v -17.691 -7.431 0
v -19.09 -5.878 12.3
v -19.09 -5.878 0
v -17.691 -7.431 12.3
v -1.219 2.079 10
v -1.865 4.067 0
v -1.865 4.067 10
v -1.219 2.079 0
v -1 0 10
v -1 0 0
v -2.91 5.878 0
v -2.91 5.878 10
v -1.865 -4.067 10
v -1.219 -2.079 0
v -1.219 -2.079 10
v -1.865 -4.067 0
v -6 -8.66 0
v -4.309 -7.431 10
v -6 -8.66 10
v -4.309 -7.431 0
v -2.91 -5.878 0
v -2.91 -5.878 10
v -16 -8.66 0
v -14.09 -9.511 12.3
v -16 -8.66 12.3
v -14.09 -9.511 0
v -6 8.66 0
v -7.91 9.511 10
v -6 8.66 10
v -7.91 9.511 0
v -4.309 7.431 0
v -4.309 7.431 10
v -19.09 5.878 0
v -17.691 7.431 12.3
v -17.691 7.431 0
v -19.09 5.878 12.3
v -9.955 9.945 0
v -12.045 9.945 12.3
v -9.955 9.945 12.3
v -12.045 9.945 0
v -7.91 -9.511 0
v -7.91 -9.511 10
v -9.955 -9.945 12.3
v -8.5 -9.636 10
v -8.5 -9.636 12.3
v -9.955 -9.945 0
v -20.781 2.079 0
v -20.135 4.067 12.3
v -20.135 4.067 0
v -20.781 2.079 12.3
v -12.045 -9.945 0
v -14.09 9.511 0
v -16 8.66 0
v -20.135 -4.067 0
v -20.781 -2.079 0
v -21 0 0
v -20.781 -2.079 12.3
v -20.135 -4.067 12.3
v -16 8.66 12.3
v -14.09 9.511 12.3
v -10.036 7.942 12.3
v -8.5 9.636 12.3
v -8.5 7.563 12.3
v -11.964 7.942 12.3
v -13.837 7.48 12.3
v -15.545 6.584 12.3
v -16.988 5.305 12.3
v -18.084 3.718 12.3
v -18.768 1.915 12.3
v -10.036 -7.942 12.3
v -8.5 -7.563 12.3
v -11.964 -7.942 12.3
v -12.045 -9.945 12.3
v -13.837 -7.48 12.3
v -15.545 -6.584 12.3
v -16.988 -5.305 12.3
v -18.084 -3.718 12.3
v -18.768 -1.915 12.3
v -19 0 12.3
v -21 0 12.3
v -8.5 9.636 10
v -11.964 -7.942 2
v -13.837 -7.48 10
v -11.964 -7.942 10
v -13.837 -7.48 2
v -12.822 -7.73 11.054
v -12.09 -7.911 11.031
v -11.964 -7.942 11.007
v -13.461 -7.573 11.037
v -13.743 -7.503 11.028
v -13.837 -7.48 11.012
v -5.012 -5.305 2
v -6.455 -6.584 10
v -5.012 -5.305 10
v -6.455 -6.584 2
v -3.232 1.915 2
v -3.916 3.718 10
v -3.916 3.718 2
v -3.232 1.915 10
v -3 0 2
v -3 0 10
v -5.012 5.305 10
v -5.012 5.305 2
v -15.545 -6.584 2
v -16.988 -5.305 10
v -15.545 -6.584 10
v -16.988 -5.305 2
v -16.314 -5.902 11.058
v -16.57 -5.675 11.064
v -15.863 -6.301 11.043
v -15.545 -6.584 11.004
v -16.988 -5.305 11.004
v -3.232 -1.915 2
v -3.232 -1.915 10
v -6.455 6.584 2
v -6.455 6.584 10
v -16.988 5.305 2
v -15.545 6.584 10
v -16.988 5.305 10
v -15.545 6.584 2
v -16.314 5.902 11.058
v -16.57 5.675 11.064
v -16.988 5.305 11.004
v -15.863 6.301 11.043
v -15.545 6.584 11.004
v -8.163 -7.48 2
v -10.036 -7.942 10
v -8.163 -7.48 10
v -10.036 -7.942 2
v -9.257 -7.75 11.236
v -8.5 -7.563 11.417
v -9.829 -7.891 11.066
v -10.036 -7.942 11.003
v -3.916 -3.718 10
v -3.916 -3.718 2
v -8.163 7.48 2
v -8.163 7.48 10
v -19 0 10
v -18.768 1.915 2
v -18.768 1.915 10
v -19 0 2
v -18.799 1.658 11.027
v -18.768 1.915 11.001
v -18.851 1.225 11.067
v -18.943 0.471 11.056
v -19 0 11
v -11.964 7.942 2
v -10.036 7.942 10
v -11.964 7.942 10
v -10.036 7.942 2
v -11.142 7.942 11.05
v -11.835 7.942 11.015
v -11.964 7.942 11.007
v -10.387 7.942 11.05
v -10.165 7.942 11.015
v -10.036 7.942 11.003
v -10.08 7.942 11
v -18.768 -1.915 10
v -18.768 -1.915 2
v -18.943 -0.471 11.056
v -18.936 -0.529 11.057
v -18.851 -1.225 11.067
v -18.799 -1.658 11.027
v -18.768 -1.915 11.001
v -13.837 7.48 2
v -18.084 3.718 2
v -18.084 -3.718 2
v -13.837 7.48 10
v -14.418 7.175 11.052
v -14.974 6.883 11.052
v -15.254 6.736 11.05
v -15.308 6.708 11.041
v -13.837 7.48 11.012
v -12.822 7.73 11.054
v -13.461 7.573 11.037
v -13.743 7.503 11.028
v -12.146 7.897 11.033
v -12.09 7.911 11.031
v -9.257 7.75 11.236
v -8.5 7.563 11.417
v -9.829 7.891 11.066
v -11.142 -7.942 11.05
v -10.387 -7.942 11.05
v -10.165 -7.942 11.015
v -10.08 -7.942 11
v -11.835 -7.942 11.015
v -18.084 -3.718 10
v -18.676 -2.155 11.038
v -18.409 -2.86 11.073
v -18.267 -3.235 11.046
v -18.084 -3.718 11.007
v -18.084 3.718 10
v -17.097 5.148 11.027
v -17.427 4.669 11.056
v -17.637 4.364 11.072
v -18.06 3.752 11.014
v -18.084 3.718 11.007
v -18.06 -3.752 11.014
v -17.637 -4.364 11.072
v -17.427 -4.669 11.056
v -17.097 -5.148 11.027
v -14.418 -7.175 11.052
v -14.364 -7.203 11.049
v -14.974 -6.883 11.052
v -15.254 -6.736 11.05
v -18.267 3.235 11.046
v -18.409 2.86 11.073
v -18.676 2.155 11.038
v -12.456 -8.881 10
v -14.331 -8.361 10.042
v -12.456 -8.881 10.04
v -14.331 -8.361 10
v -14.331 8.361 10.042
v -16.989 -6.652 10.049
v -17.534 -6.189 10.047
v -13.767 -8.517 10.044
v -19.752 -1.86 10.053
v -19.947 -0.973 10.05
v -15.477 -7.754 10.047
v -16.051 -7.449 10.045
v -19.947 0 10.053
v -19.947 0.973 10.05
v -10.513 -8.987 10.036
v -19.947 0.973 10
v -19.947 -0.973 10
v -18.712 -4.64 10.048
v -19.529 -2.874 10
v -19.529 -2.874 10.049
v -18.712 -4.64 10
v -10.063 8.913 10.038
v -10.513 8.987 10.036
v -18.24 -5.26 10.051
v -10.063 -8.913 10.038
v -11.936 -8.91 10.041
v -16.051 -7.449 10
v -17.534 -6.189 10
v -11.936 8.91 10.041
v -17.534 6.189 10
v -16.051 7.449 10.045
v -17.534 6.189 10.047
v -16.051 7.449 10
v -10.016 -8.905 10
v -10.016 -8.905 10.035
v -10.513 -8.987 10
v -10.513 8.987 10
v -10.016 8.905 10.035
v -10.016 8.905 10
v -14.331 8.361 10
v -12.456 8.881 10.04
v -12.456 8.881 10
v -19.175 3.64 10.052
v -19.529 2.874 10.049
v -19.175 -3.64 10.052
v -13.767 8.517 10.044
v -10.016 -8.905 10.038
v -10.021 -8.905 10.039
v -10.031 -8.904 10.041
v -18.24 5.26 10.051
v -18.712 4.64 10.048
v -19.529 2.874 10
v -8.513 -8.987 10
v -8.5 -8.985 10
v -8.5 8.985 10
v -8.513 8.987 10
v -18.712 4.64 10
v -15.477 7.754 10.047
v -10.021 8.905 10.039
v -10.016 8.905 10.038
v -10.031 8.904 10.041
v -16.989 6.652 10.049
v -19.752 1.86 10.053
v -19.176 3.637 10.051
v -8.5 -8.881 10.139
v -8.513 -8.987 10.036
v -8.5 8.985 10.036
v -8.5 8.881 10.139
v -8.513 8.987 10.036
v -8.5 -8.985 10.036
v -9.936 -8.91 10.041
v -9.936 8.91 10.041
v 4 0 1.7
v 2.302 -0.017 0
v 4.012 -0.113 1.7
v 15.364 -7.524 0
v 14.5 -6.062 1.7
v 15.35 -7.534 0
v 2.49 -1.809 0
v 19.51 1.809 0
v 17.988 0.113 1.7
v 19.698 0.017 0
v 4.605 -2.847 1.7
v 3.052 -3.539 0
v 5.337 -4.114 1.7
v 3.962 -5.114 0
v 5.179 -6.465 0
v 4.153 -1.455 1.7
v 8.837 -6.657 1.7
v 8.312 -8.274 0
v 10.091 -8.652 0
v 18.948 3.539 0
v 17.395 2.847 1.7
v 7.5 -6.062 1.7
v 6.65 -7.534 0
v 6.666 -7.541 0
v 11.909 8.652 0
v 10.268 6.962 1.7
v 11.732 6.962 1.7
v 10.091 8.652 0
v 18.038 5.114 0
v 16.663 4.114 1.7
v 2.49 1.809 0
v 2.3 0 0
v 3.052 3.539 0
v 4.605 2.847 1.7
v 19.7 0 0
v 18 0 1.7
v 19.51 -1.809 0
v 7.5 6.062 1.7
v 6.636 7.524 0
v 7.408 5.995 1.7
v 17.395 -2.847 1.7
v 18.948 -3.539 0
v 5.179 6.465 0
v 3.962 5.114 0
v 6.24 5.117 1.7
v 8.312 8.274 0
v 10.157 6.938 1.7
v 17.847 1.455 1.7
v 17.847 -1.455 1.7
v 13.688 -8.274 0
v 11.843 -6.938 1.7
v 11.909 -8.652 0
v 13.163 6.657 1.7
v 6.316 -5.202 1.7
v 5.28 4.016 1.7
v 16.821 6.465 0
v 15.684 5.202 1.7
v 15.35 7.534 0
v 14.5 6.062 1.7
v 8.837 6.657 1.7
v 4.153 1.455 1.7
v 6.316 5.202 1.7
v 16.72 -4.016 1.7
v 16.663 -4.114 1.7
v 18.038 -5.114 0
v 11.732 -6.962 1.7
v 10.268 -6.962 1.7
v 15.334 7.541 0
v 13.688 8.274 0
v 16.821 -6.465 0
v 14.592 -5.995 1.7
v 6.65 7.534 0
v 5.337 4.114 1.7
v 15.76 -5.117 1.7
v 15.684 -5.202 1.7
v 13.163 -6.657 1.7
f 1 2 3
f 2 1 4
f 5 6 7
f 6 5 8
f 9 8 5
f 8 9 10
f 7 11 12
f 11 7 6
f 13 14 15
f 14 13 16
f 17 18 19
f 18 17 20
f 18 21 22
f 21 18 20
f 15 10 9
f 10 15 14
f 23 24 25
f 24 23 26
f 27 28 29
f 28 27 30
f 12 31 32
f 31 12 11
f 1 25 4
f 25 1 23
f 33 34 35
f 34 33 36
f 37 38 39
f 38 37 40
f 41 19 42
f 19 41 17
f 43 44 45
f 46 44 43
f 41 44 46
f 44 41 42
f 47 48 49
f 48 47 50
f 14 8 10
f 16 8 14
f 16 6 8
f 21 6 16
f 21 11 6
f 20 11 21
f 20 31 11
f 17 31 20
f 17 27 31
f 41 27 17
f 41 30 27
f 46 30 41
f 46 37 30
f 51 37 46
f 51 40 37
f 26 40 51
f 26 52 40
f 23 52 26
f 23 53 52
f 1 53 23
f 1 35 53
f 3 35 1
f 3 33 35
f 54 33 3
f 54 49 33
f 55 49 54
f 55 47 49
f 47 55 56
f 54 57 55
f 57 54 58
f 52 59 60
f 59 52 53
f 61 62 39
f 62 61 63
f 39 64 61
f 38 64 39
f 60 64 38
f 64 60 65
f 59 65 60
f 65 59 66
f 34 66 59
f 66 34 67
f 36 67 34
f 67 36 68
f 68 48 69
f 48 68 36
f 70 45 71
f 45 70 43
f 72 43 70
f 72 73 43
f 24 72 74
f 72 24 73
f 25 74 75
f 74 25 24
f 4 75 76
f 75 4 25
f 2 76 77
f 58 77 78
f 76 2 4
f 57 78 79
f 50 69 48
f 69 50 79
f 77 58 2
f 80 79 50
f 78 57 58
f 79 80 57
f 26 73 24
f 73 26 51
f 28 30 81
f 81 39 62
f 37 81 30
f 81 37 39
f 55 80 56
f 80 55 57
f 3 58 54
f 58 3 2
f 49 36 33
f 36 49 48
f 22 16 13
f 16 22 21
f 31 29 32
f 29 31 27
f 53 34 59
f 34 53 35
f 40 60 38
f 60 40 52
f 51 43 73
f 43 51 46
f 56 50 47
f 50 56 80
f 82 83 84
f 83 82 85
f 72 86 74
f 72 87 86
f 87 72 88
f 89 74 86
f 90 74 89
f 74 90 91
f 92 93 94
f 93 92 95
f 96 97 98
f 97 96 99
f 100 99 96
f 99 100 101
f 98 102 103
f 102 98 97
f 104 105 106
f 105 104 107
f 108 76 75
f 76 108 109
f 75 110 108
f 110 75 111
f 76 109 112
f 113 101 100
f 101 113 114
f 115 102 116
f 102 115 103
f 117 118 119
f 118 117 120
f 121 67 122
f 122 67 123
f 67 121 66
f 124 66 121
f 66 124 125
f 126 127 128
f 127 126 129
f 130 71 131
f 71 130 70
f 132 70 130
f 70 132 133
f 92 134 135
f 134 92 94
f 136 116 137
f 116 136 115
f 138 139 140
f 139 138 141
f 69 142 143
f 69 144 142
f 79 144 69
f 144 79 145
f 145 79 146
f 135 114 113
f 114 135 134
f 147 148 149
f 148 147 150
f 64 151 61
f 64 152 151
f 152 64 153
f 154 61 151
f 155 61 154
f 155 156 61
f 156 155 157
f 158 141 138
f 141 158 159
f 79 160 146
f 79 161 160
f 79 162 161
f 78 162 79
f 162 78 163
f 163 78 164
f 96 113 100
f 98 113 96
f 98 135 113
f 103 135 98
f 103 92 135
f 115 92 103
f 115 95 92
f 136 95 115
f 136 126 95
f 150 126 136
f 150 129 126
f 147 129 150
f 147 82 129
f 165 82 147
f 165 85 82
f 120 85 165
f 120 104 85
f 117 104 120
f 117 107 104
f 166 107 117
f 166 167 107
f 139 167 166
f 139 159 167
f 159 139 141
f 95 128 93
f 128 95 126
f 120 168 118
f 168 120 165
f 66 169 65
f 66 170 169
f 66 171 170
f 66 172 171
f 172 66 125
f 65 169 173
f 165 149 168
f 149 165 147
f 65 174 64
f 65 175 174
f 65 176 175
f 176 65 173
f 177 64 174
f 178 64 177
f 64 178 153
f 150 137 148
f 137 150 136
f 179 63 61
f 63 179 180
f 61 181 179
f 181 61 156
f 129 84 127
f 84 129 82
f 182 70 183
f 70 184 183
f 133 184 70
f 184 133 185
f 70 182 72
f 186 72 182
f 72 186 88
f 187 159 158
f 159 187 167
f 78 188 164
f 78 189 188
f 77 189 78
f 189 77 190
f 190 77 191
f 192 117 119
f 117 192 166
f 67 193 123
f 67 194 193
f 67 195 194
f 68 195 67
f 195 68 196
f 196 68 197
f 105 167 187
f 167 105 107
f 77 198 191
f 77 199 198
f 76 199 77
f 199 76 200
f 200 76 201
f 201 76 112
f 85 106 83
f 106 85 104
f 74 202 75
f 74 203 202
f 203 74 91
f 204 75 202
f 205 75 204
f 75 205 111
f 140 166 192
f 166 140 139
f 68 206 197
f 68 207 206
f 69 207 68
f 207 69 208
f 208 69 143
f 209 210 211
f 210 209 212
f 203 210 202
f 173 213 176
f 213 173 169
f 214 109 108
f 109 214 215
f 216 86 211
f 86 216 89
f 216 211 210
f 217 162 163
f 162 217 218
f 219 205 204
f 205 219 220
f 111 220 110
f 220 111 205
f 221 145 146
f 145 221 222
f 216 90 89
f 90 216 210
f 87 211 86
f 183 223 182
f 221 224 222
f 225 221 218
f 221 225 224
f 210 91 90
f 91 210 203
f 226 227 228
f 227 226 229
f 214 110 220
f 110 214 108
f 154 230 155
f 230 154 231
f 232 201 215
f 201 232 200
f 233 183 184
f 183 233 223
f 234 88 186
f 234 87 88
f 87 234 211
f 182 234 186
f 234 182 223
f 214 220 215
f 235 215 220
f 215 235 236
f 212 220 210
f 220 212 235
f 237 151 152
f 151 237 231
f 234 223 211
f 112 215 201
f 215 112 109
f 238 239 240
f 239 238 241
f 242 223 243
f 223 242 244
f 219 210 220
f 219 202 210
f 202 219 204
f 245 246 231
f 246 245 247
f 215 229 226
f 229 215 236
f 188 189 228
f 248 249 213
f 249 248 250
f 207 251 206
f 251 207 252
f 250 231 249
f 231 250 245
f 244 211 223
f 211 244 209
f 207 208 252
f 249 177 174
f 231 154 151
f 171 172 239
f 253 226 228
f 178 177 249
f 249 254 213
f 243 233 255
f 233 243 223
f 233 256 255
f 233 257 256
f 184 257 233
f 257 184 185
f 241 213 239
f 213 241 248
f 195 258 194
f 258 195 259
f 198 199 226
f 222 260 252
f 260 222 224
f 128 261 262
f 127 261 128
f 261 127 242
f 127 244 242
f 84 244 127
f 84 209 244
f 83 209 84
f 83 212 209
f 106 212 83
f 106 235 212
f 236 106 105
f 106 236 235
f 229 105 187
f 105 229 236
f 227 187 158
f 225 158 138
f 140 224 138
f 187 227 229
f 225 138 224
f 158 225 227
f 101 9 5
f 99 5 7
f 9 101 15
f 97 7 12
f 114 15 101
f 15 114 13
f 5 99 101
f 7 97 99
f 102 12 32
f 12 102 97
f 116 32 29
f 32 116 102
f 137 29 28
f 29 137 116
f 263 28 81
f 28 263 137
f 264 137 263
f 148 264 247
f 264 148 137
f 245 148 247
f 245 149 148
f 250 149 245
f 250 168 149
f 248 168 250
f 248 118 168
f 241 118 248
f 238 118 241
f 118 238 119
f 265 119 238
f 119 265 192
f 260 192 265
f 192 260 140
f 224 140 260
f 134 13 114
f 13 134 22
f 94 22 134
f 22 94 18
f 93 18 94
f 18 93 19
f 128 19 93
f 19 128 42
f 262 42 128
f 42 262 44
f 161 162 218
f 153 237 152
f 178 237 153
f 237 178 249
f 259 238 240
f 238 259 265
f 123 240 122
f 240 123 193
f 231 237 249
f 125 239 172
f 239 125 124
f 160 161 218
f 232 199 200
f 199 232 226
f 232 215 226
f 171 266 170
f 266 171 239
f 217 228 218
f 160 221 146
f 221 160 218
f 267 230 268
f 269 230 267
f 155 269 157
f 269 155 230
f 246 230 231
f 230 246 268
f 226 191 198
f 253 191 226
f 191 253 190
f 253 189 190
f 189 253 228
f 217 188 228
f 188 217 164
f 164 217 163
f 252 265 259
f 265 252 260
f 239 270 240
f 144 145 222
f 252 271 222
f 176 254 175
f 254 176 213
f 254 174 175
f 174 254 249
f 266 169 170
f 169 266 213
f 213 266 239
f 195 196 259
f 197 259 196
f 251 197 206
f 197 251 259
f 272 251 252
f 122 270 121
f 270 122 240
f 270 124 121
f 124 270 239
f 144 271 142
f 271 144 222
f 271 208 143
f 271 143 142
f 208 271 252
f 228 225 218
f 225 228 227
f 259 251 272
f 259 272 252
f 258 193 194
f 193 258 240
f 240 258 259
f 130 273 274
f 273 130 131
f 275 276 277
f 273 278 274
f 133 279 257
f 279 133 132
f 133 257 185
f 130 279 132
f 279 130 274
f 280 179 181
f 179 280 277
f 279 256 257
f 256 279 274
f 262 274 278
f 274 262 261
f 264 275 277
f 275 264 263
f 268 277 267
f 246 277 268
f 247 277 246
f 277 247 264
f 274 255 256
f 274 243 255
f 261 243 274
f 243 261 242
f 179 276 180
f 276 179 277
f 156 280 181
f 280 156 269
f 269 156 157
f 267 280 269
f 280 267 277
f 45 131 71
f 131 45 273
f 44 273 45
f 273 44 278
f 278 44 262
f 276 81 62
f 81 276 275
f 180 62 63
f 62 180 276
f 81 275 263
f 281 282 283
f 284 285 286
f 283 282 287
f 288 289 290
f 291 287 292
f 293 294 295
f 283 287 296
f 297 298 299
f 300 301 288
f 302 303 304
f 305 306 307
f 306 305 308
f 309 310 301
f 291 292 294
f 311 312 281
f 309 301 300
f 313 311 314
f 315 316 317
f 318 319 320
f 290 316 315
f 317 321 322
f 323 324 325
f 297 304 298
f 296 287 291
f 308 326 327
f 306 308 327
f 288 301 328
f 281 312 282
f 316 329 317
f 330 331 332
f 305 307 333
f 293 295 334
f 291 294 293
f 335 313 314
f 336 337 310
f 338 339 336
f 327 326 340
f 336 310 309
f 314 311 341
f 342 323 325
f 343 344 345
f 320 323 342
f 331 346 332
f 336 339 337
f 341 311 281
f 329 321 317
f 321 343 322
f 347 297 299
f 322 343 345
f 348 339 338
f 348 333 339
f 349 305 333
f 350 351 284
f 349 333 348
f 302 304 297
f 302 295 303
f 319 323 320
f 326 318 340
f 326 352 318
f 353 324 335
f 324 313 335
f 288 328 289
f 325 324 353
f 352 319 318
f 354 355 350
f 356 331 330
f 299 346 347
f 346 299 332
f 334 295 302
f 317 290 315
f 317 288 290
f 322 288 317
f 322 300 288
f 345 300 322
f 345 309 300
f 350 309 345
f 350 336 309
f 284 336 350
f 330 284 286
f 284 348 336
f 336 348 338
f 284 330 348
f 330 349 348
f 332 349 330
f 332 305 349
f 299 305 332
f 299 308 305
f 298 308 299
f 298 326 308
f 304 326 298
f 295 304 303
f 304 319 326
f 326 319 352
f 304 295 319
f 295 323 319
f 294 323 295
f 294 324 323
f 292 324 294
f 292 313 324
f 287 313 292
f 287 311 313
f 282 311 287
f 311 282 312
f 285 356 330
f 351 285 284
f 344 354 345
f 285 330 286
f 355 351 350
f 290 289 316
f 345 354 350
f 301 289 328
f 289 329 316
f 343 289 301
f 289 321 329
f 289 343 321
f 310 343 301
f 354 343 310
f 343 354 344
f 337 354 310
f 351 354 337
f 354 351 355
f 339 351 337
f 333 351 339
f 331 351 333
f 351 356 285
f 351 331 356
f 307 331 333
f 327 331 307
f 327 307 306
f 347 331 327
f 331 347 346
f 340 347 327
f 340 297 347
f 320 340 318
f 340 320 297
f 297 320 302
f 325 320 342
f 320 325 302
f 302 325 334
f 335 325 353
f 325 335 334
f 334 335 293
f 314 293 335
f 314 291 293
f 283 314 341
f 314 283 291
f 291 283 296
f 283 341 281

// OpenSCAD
// [FL_INDEX: keywords="openscad, 3d_parametric, Customizable_Cylindrical_Container, csg_solid" | COT="Parametric OpenSCAD design from 3DCodeverse"]
// Title: Customizable Cylindrical Container

//Author: Devin Grady
//License: CC BY 3.0 US ( http://creativecommons.org/licenses/by/3.0/us/ )

//Inner radius (open space in interior)
radius = 10; 

//Inner height (open space in interior)
height = 10; 

//Maximum wall thickness; will be cut into to fit lid.
wall = 2; 

//Fit tolerance parameter.
tolerance = .3; 

module cylinder_box(r=radius, h=height, w=wall, tol=tolerance){
	difference(){
		cylinder(r=r,h=h+w+tol);
		translate([0,0,w])cylinder(r=r-w, h = h+w+2*tol);
		translate([0,0,h])cylinder_lid(r=r,w=w, tol = 0);
		translate([w,0,h])cylinder_lid(r=r,w=w, tol = 0);
		translate([r/4, -r, h])cube([2*r, 2*r, r]);
	}
}
module cylinder_lid(r=radius, w=wall, tol = tolerance){
	hull(){difference(){
		cylinder(r=r-w/2, h=w-tol);
		translate([0,0,-tol])rotate_extrude()translate([r-w/2,0,0])rotate([0,0,45])square(r);
	}}
}


translate([-1.1*radius,0,0])cylinder_box();
translate([1.1*radius,0,0])cylinder_lid();
